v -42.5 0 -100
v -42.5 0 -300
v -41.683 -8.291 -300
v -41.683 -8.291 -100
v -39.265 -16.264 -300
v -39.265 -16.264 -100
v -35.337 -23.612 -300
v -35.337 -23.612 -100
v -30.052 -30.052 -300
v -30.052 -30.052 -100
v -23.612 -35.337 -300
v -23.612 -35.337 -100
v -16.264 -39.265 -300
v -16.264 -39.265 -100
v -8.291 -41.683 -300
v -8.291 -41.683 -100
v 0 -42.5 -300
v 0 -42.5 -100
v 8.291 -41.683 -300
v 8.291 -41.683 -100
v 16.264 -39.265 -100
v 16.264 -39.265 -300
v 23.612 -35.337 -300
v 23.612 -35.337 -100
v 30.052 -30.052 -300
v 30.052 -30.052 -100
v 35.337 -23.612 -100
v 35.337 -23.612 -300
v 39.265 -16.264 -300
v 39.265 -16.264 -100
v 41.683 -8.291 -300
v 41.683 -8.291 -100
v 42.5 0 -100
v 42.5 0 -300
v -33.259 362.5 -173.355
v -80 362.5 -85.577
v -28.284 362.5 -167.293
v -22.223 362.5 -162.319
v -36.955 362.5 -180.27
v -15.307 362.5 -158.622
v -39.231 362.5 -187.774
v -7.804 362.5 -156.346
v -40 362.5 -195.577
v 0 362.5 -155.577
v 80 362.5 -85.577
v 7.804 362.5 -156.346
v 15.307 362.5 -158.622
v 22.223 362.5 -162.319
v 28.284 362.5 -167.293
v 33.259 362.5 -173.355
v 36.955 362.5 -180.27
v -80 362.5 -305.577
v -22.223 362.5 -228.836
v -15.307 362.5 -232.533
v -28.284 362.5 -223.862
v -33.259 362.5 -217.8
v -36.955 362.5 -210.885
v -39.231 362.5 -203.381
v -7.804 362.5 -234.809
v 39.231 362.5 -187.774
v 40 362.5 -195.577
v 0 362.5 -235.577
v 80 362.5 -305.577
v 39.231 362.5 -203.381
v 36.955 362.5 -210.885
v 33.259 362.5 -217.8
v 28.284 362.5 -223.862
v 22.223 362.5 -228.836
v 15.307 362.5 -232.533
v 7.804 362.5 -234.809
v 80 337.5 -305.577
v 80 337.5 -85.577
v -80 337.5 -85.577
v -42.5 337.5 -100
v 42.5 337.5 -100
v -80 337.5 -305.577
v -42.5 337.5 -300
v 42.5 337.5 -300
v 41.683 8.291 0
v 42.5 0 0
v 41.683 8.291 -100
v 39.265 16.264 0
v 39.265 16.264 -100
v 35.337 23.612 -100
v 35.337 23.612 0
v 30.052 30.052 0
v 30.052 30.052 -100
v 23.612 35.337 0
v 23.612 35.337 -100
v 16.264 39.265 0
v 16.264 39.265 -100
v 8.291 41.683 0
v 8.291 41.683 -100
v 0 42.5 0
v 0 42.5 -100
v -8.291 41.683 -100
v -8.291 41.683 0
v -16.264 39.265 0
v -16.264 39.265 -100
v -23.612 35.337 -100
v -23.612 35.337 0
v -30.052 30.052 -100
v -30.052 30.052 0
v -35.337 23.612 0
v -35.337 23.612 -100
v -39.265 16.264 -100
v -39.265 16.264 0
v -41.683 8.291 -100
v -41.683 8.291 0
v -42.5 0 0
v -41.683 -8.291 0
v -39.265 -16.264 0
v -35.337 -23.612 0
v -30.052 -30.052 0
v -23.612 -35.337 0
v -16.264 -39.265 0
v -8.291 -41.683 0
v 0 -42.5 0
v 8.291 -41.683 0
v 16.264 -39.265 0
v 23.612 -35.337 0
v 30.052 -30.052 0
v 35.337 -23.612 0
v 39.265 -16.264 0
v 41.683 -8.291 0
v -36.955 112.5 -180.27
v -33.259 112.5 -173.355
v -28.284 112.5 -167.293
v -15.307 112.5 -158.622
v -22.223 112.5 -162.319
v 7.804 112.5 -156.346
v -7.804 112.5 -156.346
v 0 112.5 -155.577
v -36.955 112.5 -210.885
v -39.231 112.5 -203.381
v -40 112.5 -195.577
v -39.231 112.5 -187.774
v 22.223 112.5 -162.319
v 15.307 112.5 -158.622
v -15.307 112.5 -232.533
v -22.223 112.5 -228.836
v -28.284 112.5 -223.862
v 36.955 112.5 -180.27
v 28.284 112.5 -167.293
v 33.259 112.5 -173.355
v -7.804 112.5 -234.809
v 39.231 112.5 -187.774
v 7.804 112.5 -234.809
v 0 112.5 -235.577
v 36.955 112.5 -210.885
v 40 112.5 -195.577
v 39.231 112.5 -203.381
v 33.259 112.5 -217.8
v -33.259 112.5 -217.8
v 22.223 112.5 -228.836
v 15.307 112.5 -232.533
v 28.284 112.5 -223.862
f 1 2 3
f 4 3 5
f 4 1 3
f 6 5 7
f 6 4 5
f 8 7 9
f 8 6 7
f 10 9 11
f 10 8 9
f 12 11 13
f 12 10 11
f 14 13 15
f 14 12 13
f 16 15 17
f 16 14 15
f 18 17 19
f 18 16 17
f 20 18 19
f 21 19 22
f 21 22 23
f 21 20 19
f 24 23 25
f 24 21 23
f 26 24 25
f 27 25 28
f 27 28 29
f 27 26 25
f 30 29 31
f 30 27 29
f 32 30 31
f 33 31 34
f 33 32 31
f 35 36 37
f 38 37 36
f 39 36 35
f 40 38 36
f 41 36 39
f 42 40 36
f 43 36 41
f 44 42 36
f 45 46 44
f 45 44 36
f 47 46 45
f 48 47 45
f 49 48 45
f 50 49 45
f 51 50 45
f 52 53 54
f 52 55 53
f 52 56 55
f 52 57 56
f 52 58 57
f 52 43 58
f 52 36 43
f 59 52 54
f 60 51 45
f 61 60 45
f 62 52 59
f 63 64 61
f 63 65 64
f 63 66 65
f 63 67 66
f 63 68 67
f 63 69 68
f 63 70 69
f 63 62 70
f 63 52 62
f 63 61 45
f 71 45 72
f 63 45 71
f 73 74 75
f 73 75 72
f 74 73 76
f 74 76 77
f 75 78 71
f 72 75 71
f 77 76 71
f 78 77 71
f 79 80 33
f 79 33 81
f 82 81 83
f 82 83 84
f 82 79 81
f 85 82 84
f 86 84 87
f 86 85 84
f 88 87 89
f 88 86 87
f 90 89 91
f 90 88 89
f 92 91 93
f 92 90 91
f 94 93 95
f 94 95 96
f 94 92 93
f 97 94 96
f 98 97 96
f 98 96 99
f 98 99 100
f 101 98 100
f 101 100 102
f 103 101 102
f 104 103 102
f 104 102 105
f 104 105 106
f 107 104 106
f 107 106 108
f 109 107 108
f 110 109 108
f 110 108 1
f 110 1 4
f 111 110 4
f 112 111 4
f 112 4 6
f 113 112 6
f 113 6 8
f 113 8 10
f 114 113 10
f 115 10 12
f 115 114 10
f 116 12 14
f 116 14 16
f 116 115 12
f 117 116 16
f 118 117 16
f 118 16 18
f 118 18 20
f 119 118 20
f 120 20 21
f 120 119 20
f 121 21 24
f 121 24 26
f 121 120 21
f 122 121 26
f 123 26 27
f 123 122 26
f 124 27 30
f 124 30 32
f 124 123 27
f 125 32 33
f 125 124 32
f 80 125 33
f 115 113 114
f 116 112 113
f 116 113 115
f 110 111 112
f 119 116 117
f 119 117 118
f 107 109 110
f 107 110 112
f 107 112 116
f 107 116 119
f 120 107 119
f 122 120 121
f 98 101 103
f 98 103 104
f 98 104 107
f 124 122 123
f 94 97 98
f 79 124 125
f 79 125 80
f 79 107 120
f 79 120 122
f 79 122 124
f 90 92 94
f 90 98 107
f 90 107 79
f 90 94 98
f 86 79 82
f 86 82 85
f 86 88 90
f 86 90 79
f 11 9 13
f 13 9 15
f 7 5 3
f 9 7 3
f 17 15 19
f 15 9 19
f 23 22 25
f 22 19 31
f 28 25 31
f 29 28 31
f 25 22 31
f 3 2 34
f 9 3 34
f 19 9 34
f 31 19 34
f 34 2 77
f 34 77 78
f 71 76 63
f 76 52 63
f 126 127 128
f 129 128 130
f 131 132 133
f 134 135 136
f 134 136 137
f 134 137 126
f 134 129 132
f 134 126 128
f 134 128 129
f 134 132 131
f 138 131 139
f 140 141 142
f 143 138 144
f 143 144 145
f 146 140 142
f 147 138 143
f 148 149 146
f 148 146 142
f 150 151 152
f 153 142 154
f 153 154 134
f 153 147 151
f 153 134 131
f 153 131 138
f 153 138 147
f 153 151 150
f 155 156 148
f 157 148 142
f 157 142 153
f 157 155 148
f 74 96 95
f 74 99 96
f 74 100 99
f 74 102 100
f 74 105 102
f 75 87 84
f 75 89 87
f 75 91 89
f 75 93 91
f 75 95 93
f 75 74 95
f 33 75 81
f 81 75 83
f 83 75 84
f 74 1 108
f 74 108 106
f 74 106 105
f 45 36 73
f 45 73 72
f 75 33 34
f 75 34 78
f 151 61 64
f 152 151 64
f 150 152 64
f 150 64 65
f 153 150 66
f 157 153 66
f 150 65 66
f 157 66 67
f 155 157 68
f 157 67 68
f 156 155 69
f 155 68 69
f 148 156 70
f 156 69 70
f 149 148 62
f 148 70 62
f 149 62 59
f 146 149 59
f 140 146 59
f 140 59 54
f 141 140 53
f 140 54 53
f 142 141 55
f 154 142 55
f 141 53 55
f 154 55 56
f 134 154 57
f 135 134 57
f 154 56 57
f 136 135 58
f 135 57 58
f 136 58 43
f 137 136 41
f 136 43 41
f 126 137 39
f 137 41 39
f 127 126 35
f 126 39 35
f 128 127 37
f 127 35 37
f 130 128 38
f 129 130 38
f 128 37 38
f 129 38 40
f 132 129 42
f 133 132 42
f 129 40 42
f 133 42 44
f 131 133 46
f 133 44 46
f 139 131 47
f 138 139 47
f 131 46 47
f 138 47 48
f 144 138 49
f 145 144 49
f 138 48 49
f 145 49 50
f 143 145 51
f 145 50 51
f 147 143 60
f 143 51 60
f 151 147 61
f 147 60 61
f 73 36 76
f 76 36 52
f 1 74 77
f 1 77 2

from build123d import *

# Parameters (mm, degrees)
SKETCH1_R           = 42.5
BOSS_EXTRUDE1_DEPTH = 100
BOSS_EXTRUDE2_DEPTH = 200
SKETCH5_W           = 160
SKETCH5_H           = 220
BOSS_EXTRUDE4_DEPTH = 12.5
SKETCH6_R           = 40
CUT_EXTRUDE1_DEPTH  = 250


with BuildPart() as part:
    # Sketch1 → Boss-Extrude1 (new body)
    with BuildSketch(Plane.XY):
        Circle(SKETCH1_R)
    extrude(amount=-BOSS_EXTRUDE1_DEPTH)

    # Sketch2 → Boss-Extrude2 (add)
    with BuildSketch(Plane(origin=(0, 0, -100), x_dir=(-1, 0, 0), z_dir=(0, 0, -1))):
        with BuildLine():
            Line((-42.5, 350), (42.5, 350))
            Line((42.5, 350), (42.5, 0))
            ThreePointArc((42.5, 0), (0, -42.5), (-42.5, 0))
            Line((-42.5, 0), (-42.5, 350))
        make_face()
    extrude(amount=BOSS_EXTRUDE2_DEPTH)

    # Sketch5 → Boss-Extrude4 (add, symmetric)
    with BuildSketch(Plane(origin=(0, 350, 104.422680699), x_dir=(1, 0, 0), z_dir=(0, 1, 0))):
        with Locations((0, 300)):
            Rectangle(SKETCH5_W, SKETCH5_H)
    extrude(amount=BOSS_EXTRUDE4_DEPTH, both=True)

    # Sketch6 → Cut-Extrude1 (cut)
    with BuildSketch(Plane(origin=(0, 362.5, 104.422680699), x_dir=(1, 0, 0), z_dir=(0, 1, 0))):
        with Locations((0, 300)):
            Circle(SKETCH6_R)
    extrude(amount=-CUT_EXTRUDE1_DEPTH, mode=Mode.SUBTRACT)


solid = part.part
